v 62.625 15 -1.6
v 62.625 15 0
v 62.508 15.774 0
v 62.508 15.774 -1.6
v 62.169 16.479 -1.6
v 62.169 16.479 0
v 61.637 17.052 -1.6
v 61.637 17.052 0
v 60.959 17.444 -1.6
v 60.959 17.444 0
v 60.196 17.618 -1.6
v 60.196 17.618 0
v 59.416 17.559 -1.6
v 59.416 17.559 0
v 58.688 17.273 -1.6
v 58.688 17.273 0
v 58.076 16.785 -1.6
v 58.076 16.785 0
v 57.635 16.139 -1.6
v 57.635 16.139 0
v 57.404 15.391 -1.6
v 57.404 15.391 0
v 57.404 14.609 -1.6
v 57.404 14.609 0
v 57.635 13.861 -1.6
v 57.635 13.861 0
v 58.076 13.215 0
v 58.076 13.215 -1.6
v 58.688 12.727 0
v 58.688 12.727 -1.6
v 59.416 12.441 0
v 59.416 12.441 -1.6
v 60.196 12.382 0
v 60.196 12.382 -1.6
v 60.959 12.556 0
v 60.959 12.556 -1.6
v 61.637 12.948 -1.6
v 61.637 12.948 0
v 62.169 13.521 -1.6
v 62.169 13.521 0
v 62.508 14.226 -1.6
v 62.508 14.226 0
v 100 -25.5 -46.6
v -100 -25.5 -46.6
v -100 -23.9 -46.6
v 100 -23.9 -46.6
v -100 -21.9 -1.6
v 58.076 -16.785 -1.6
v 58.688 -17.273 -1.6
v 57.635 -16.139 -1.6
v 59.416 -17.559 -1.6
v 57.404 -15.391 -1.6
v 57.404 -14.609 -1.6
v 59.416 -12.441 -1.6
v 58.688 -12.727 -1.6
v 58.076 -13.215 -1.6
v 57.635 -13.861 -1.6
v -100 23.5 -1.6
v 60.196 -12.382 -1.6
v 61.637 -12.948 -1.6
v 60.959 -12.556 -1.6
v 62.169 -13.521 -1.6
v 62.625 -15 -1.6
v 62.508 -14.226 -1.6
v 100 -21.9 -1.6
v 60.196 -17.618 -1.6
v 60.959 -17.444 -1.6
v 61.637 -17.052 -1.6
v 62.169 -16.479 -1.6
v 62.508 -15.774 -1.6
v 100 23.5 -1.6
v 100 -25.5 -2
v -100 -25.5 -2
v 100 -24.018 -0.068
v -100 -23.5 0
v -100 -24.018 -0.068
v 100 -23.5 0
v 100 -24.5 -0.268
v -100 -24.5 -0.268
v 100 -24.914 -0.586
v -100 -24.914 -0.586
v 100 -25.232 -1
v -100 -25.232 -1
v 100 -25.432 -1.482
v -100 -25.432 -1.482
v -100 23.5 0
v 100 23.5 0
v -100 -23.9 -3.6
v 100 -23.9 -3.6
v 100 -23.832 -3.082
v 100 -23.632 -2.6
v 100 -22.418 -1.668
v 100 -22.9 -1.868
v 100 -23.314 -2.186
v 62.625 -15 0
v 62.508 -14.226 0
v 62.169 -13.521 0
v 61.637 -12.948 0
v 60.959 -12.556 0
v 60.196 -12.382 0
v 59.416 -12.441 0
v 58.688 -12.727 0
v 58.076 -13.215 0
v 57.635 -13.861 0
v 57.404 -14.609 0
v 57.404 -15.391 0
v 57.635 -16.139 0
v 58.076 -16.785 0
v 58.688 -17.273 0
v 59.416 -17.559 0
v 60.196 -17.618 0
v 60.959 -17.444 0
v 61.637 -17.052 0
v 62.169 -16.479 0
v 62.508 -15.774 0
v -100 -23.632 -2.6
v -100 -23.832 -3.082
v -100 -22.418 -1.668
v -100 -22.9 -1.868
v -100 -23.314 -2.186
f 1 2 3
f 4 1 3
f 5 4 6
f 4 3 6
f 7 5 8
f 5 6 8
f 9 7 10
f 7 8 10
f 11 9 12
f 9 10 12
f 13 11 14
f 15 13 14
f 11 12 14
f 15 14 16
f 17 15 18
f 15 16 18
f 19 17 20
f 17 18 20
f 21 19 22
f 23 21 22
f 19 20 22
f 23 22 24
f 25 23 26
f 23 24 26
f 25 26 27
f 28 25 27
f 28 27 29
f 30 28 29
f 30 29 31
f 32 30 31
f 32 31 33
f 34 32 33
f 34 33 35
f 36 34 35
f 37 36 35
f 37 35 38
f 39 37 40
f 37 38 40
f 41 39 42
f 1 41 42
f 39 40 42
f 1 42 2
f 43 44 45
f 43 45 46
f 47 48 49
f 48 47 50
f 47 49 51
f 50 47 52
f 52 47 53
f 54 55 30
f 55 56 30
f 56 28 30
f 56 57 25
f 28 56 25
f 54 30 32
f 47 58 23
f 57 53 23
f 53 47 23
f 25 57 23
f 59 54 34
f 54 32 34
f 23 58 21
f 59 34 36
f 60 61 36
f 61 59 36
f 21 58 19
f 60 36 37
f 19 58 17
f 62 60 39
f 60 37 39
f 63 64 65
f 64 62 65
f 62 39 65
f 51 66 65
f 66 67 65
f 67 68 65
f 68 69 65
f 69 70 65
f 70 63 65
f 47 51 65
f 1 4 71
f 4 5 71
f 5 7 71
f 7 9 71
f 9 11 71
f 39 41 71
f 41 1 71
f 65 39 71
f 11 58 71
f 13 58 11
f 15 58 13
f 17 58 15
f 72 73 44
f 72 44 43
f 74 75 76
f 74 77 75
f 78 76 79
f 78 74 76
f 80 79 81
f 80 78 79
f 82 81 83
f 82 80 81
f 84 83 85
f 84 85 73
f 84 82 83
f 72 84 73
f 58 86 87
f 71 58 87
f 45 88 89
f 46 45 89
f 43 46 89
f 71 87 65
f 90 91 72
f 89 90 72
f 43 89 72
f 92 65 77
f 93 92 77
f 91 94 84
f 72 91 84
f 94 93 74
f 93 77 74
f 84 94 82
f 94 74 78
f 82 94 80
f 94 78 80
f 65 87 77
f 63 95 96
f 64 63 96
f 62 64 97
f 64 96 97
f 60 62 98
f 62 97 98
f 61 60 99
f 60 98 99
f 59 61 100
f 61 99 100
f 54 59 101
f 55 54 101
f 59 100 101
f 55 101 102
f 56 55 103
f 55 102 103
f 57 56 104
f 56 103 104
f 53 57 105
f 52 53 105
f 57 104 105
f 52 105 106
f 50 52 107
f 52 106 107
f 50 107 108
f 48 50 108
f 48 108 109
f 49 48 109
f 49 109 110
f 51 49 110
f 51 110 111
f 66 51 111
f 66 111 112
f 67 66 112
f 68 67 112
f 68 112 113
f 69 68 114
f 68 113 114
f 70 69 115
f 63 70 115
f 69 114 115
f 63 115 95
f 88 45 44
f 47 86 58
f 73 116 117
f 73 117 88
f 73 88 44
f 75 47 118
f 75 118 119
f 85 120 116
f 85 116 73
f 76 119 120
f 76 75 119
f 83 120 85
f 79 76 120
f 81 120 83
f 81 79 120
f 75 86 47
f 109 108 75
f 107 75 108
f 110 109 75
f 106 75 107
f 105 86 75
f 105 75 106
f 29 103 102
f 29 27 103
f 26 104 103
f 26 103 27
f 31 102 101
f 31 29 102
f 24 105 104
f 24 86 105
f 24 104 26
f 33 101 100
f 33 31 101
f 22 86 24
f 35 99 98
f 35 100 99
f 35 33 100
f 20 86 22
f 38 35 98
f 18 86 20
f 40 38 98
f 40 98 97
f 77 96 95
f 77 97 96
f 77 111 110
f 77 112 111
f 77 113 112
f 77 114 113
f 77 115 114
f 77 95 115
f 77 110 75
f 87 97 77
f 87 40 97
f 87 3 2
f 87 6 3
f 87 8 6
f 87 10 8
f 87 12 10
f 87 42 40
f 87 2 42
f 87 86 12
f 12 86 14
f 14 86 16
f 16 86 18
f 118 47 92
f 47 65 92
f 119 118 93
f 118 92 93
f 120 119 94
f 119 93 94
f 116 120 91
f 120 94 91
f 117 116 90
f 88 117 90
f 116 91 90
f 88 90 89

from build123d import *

# Parameters (mm, degrees)
F0_W     = 200
F0_H     = 49
F0_R     = 2.625
F1_DEPTH = 1.6
F3_W     = 200
F3_H     = 1.6
F4_DEPTH = 45
F5_R     = 2


with BuildPart() as f1:
    # F0 (on Top) → F1 (new body)
    with BuildSketch(Plane.XY):
        with Locations((0, -1)):
            Rectangle(F0_W, F0_H)
        with Locations((60, -15)):
            Circle(F0_R, mode=Mode.SUBTRACT)
        with Locations((60, 15)):
            Circle(F0_R, mode=Mode.SUBTRACT)
    extrude(amount=-F1_DEPTH)

    # F3 (on face) → F4 (join)
    with BuildSketch(Plane(origin=(0, 0, -1.6), x_dir=(1, 0, 0), z_dir=(0, 0, -1))):
        with Locations((0, 24.7)):
            Rectangle(F3_W, F3_H)
    extrude(amount=F4_DEPTH)

    # F5
    f5_edges = [f1.edges().sort_by_distance(p)[0] for p in [
        (0, -23.9, -1.6),
        (0, -25.5, 0),
    ]]
    fillet(f5_edges, radius=F5_R)


solid = f1.part
